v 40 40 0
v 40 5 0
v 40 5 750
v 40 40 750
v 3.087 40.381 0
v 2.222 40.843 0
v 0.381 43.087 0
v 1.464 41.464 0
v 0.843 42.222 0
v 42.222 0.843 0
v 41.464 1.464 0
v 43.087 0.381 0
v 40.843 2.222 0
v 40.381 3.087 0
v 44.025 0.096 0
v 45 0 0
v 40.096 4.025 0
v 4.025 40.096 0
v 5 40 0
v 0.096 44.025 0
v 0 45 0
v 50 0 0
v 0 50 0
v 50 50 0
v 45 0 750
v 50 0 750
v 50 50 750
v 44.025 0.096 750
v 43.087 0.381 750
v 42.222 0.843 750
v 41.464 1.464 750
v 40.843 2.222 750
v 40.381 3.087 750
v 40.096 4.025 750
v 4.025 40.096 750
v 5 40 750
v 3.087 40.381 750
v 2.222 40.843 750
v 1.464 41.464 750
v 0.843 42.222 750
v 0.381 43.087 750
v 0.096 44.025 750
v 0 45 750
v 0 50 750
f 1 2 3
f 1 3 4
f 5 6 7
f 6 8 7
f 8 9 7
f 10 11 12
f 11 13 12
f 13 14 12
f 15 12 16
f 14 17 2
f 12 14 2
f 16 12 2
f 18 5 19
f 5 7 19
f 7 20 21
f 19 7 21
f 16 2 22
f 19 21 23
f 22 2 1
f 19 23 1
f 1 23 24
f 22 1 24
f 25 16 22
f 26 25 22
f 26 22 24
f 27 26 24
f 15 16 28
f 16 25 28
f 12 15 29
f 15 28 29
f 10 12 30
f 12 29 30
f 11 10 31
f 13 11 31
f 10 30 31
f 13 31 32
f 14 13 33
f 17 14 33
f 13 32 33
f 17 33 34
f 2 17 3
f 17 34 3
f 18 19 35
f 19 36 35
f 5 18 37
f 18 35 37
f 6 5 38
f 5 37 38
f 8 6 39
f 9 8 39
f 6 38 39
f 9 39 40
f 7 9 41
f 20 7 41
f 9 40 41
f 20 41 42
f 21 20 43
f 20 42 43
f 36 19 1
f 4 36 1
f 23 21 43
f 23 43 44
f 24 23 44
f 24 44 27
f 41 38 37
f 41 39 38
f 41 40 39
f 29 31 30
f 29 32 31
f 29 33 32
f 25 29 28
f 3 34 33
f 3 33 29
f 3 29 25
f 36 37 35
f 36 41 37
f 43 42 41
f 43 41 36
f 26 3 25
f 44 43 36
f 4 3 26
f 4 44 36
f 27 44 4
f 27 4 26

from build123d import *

# Parameters (mm, degrees)
BOX001_W     = 40
BOX001_H     = 40
BOX001_DEPTH = 750
BOX_W        = 50
BOX_H        = 50
BOX_DEPTH    = 750
FILLET_R     = 5
FILLET001_R  = 5


with BuildPart() as box001:
    # Box001 → Box001 (new body)
    with BuildSketch(Plane.XY):
        with Locations((20, 20)):
            Rectangle(BOX001_W, BOX001_H)
    extrude(amount=BOX001_DEPTH)


with BuildPart() as fillet001:
    # Box → Box (new body)
    with BuildSketch(Plane.XY):
        with Locations((25, 25)):
            Rectangle(BOX_W, BOX_H)
    extrude(amount=BOX_DEPTH)

    # Cut: cut Box001
    add(box001.part, mode=Mode.SUBTRACT)

    # Fillet
    fillet_edges = [fillet001.edges().sort_by_distance(p)[0] for p in [
        (40, 0, 375),
    ]]
    fillet(fillet_edges, radius=FILLET_R)

    # Fillet001
    fillet001_edges = [fillet001.edges().sort_by_distance(p)[0] for p in [
        (0, 40, 375),
    ]]
    fillet(fillet001_edges, radius=FILLET001_R)


solid = fillet001.part
